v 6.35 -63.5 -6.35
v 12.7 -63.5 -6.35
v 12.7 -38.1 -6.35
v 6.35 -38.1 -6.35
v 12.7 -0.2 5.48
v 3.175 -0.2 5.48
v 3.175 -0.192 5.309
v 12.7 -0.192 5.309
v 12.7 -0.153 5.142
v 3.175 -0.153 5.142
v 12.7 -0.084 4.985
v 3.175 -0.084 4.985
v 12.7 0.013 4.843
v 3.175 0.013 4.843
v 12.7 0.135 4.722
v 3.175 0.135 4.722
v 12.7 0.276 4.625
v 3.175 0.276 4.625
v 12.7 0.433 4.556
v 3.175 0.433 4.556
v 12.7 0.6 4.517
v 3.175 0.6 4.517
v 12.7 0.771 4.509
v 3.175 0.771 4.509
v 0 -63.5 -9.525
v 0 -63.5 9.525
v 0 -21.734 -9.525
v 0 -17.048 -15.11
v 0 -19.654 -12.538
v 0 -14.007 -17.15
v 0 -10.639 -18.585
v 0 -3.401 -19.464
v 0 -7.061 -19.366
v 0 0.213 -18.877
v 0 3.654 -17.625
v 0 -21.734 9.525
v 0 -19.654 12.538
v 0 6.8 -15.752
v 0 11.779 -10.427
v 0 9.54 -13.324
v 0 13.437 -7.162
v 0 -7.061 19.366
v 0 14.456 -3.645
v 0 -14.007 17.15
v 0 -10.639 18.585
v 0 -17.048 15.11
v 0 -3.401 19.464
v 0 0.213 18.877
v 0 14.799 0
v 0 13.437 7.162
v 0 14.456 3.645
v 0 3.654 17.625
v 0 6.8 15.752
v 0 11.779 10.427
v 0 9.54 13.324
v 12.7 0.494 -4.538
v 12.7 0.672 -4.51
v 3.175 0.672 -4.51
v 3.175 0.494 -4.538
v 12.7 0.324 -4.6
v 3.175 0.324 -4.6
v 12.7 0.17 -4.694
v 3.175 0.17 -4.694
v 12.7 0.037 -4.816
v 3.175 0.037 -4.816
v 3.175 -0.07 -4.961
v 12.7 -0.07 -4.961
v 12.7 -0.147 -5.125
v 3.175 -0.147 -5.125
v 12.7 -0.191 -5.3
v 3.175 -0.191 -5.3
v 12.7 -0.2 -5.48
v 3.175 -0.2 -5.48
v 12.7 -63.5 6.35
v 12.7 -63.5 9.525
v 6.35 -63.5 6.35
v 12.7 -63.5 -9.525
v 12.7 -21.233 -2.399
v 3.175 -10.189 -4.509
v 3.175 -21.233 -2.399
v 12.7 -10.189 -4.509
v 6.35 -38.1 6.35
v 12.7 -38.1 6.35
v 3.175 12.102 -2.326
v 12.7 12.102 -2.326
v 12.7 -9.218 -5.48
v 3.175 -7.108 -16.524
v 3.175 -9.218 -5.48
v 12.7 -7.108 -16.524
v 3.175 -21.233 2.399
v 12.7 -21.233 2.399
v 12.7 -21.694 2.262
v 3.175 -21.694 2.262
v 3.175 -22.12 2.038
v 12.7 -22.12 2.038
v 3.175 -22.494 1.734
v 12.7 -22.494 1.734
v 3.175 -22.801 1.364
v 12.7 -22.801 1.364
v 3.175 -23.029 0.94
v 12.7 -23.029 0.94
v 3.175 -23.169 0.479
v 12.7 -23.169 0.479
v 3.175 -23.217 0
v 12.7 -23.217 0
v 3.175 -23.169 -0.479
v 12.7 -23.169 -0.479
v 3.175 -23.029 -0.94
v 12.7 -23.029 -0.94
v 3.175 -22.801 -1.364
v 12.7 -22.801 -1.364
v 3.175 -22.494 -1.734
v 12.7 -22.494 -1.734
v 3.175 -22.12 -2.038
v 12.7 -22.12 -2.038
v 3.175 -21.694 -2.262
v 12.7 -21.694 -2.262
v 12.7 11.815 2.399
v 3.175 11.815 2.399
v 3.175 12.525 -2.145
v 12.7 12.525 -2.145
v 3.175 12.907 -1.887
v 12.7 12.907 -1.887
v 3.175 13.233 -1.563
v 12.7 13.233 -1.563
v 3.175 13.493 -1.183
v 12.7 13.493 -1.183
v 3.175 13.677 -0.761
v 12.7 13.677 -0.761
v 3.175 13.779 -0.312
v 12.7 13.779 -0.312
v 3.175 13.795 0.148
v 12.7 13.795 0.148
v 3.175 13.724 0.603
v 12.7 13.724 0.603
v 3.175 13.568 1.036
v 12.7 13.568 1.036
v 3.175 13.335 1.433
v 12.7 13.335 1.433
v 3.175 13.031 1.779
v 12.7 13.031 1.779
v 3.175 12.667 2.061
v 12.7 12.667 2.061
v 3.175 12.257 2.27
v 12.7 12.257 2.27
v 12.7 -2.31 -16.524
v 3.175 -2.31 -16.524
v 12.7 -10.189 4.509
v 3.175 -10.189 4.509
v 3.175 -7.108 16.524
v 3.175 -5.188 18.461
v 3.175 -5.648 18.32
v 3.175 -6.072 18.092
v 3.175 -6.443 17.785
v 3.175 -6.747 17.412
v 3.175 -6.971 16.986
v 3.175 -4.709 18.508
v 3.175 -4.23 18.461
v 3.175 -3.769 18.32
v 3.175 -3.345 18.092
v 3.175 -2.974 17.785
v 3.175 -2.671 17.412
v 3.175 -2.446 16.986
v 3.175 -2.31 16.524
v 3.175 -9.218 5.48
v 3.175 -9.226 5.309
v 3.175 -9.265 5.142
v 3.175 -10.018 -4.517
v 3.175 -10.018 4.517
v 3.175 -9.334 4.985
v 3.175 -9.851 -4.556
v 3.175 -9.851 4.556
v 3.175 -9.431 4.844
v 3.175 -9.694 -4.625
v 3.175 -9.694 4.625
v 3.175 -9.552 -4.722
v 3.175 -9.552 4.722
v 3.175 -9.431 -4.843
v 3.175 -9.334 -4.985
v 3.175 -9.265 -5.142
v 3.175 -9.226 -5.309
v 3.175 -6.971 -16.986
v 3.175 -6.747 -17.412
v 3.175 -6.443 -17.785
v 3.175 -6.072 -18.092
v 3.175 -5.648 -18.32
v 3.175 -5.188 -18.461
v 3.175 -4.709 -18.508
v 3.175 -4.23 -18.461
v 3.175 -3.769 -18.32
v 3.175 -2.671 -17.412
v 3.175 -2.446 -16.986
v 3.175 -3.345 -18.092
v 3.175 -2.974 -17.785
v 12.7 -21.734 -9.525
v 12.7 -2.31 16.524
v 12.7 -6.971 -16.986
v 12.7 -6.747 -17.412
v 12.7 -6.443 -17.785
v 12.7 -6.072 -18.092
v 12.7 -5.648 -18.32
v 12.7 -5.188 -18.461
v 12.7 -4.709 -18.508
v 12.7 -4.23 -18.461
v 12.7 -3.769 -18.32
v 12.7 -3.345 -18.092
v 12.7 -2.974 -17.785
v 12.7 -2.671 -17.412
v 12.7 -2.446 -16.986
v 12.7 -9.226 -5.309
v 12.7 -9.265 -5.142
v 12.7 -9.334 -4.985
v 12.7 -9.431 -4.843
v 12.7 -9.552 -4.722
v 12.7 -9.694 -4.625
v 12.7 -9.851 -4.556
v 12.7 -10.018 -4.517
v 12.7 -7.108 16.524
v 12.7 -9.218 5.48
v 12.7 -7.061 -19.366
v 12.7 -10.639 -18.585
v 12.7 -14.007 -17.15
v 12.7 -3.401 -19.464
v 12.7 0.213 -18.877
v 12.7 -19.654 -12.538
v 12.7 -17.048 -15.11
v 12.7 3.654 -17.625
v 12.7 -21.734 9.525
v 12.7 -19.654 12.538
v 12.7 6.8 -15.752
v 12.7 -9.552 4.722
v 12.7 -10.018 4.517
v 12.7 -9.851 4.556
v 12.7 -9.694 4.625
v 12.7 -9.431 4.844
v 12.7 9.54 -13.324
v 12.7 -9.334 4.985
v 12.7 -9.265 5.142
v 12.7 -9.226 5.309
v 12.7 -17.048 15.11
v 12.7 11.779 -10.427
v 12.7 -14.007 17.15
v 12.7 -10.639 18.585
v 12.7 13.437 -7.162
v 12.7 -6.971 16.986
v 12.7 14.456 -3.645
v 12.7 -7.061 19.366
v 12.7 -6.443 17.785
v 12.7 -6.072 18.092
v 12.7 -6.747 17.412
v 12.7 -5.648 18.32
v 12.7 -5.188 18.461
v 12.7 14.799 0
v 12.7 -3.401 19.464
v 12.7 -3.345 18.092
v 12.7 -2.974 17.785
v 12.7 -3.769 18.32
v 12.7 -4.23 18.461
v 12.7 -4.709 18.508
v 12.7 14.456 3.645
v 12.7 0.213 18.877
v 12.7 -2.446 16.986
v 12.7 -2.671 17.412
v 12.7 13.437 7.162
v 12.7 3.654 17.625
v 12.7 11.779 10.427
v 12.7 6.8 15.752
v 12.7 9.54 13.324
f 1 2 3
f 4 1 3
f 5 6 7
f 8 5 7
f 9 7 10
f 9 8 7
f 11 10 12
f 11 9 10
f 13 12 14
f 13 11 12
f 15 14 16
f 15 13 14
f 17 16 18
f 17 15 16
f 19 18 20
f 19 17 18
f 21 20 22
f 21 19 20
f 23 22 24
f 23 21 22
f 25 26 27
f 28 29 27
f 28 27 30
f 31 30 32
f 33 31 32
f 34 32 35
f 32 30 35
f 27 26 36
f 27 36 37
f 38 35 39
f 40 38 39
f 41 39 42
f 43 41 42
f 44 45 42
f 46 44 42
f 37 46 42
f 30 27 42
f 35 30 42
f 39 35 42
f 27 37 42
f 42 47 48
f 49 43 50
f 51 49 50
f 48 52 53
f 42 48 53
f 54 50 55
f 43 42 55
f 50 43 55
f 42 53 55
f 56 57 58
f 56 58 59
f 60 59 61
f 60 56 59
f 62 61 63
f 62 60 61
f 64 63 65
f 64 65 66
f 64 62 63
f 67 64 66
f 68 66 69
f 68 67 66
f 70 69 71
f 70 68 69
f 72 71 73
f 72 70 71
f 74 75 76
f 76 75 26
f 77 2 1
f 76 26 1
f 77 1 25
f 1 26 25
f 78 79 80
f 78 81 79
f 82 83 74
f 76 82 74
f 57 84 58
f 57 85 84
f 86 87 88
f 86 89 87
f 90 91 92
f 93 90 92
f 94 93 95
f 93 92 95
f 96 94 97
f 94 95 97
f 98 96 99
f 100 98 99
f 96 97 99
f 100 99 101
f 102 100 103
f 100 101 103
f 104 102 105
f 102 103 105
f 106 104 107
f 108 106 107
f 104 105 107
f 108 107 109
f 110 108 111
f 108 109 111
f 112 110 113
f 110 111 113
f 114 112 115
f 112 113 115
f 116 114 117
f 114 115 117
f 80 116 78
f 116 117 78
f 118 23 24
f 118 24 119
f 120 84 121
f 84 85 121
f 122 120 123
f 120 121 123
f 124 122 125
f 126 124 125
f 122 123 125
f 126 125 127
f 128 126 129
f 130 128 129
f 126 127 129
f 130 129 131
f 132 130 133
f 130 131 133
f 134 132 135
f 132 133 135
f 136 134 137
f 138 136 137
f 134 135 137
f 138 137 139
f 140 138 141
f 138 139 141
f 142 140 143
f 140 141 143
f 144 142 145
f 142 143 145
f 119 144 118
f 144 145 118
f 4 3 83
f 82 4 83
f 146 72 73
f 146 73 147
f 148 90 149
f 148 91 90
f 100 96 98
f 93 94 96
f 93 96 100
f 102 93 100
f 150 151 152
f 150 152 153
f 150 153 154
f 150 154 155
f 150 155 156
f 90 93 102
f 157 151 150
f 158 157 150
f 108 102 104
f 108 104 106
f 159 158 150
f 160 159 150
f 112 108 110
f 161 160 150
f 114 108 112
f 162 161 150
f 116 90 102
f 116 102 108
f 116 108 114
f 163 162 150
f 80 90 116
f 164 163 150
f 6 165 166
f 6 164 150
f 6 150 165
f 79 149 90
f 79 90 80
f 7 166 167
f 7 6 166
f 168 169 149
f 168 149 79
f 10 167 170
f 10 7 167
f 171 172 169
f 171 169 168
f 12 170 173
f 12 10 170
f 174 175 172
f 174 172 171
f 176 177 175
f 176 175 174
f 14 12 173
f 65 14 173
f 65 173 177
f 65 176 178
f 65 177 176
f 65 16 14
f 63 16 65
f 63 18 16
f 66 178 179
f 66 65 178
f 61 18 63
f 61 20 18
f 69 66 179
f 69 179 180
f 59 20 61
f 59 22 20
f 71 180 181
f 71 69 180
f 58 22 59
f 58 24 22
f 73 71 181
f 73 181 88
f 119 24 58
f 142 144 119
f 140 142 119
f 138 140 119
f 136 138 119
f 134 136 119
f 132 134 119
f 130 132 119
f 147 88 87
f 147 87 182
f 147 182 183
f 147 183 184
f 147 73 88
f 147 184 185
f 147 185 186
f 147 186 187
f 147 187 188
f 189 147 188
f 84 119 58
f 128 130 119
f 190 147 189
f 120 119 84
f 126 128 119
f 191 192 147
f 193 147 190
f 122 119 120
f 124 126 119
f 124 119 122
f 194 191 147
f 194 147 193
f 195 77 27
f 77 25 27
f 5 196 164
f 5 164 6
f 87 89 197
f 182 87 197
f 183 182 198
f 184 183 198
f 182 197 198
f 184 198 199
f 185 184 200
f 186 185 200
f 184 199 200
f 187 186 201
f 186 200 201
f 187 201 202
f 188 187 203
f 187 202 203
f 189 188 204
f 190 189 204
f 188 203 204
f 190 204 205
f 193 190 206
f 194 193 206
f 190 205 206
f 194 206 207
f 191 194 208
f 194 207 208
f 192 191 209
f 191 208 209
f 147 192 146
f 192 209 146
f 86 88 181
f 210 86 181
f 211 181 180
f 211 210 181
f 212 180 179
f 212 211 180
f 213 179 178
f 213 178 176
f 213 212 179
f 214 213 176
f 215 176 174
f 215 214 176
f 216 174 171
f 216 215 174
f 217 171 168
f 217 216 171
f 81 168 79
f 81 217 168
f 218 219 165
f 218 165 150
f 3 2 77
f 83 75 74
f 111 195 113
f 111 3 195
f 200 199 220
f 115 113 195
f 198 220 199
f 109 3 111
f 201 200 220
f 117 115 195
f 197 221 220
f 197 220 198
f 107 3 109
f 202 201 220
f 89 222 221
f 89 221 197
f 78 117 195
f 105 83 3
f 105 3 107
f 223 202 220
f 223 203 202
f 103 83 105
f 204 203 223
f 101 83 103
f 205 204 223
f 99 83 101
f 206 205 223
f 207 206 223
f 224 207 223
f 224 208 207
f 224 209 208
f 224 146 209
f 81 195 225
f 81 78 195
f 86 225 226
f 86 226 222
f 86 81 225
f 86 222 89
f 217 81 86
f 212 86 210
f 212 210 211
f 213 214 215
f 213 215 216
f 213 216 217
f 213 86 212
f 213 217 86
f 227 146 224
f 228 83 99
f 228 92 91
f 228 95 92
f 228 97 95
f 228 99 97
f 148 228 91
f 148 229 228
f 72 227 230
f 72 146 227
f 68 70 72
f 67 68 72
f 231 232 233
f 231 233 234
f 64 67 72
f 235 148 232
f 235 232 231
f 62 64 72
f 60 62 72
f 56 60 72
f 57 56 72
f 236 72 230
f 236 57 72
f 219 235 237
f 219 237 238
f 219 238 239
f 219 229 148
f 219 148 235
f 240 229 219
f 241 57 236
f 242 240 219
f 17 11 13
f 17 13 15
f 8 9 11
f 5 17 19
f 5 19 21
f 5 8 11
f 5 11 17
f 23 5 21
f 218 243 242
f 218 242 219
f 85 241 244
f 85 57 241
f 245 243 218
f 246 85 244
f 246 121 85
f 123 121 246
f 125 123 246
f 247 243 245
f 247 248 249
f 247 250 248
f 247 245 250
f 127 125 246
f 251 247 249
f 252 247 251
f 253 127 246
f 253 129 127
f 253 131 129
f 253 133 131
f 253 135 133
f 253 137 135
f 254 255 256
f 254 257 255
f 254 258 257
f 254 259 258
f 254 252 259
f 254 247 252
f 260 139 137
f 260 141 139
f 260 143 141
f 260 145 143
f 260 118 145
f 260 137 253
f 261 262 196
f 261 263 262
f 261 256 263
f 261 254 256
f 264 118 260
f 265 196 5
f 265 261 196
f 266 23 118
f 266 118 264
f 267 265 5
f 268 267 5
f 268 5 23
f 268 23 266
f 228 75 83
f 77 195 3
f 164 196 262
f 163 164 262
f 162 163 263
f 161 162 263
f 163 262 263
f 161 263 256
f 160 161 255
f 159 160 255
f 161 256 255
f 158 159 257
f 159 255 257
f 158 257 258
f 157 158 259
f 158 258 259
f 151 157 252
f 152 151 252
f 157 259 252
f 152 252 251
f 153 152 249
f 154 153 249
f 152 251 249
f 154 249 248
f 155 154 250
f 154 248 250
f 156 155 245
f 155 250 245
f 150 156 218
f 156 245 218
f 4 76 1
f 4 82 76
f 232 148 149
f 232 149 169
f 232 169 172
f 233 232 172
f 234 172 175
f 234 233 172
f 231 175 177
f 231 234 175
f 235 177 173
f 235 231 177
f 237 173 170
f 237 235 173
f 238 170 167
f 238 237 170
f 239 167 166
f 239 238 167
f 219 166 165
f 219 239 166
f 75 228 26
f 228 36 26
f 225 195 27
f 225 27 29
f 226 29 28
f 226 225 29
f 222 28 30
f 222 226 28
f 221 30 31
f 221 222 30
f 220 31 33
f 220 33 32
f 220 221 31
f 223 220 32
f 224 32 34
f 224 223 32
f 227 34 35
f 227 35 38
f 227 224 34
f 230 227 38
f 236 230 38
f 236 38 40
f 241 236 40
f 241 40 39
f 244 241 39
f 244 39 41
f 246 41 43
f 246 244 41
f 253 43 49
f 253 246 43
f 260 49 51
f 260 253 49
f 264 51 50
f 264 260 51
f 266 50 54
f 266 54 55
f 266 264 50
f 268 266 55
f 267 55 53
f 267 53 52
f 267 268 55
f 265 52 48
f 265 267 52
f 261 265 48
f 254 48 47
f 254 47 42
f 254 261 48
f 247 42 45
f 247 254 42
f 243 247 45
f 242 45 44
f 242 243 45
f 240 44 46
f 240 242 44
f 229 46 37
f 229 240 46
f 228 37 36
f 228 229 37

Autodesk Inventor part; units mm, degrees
ref_plane "YZ Plane" through (0, 0, 0) normal (1, 0, 0) x (0, 1, 0)
ref_plane "XZ Plane" through (0, 0, 0) normal (0, 1, 0) x (-1, 0, 0)
ref_plane "XY Plane" through (0, 0, 0) normal (0, 0, 1) x (1, 0, 0)
sketch "Sketch1" plane through (0, 0, 0) normal (1, 0, 0) x (0, 1, 0)
  line L0 (0, 9.525) -> (-63.5, 9.525)
  line L1 (-63.5, 9.525) -> (-63.5, -9.525)
  line L2 (-63.5, -9.525) -> (0, -9.525)
  line L3 (0, -9.525) -> (0, 9.525)
  arc A0 (0, -9.525) -> (0, 9.525) centre (0, 0) ccw
  dimension "d0" = 19.05
  dimension "d1" = 63.5
extrude "Extrusion1" add sketch "Sketch1" along normal blind 12.7
sketch "Sketch3" plane through (12.7, 0, 0) normal (1, 0, 0) x (0, 0, -1)
  line L0 (-9.525, 0) -> (-9.525, -63.5) projected
  line L1 (-9.525, -63.5) -> (9.525, -63.5) projected
  line L2 (9.525, -63.5) -> (9.525, 0) projected
  arc A0 (9.525, 0) -> (-9.525, 0) centre (0, 0) ccw projected
  line L3 (-6.35, -63.5) -> (6.35, -63.5)
  line L4 (6.35, -63.5) -> (6.35, -38.1)
  line L5 (6.35, -38.1) -> (-6.35, -38.1)
  line L6 (-6.35, -38.1) -> (-6.35, -63.5)
  point P0 (0, -63.5)
  dimension "d18" = 12.7
  dimension "d19" = 6.35
  dimension "d20" = 25.4
extrude "Extrusion3" cut sketch "Sketch3" against normal blind 6.35 contours L6 L5 L4 L1
sketch "Sketch4" plane through (12.7, 0, 0) normal (1, 0, 0) x (0, 0, -1)
  line L0 (-6.35, -63.5) -> (-6.35, -38.1) projected
  line L1 (-6.35, -38.1) -> (6.35, -38.1) projected
  line L2 (6.35, -38.1) -> (6.35, -63.5) projected
  line L3 (6.35, -63.5) -> (9.525, -63.5) projected
  line L4 (9.525, -63.5) -> (9.525, 0) projected
  arc A0 (9.525, 0) -> (-9.525, 0) centre (0, 0) ccw projected
  line L5 (-9.525, 0) -> (-9.525, -63.5) projected
  line L6 (-9.525, -63.5) -> (-6.35, -63.5) projected
  circle A1 centre (0, 0) radius 9.525
  line L7 (-14.2875, 12.7) -> (12.7, 12.7)
  line L8 (12.7, 12.7) -> (12.7, -4.7625)
  line L9 (12.7, -4.7625) -> (-14.2875, -4.7625)
  line L10 (-14.2875, -4.7625) -> (-14.2875, 12.7)
  point P0 (-8.2489, -4.7625)
  point P1 (-9.525, 0)
  point P2 (9.525, 0)
  point P3 (8.2489, -4.7625)
  dimension "d28" = 19.05
extrude "Extrusion4" [suppressed]
sketch "Sketch5" plane through (12.7, 0, 0) normal (1, 0, 0) x (0, 0, -1)
  arc A0 (1.8331, 11.9745) -> (-1.9, 11.7198) centre (0, 11.3568) ccw
  line L0 (-1.9, 11.7198) -> (-4, 0.7283)
  arc A1 (-5.4371, -0.709) -> (-4, 0.7283) centre (-5.4371, 0.7281) ccw
  line L1 (-5.4371, -0.709) -> (-16.4286, -2.8088)
  arc A2 (-16.4286, -2.8088) -> (-16.4286, -6.6088) centre (-16.0656, -4.7088) ccw
  line L2 (-16.4286, -6.6088) -> (-5.4371, -8.7087)
  arc A3 (-4, -10.146) -> (-5.4371, -8.7087) centre (-5.4371, -10.1458) ccw
  line L3 (-4, -10.146) -> (-1.9, -21.1375)
  arc A4 (-1.9, -21.1375) -> (1.9, -21.1375) centre (0, -20.7745) ccw
  line L4 (1.9, -21.1375) -> (4, -10.146)
  arc A5 (5.4371, -8.7088) -> (4, -10.146) centre (5.4371, -10.146) ccw
  line L5 (5.4371, -8.7088) -> (16.4286, -6.6088)
  arc A6 (16.4286, -6.6088) -> (16.4286, -2.8088) centre (16.0656, -4.7088) ccw
  line L6 (16.4286, -2.8088) -> (5.4367, -0.7088)
  arc A7 (4.0053, 0.6052) -> (5.4367, -0.7088) centre (5.4371, 0.7283) ccw
  line L7 (4.0053, 0.6052) -> (1.8331, 11.9745)
  line L8 (-6.35, -63.5) -> (-6.35, -38.1) projected
  line L9 (-6.35, -38.1) -> (6.35, -38.1) projected
  line L10 (6.35, -38.1) -> (6.35, -63.5) projected
  line L11 (6.35, -63.5) -> (9.525, -63.5) projected
  line L12 (9.525, -63.5) -> (9.525, 0) projected
  arc A8 (9.525, 0) -> (-9.525, 0) centre (0, 0) ccw projected
  line L13 (-9.525, 0) -> (-9.525, -63.5) projected
  line L14 (-9.525, -63.5) -> (-6.35, -63.5) projected
  line L15 (-4.509, 0.7712) -> (-2.399, 11.8152)
  arc A9 (2.3259, 12.1019) -> (-2.399, 11.8152) centre (0, 11.3568) ccw
  line L16 (2.3259, 12.1019) -> (4.5097, 0.672)
  arc A10 (4.5097, 0.672) -> (5.4797, -0.1998) centre (5.4371, 0.7283) ccw
  line L17 (5.4797, -0.1998) -> (16.524, -2.3098)
  arc A11 (16.524, -7.1078) -> (16.524, -2.3098) centre (16.0656, -4.7088) ccw
  line L18 (16.524, -7.1078) -> (5.48, -9.2178)
  arc A12 (5.48, -9.2178) -> (4.509, -10.1889) centre (5.4371, -10.146) ccw
  line L19 (4.509, -10.1889) -> (2.399, -21.2328)
  arc A13 (-2.399, -21.2328) -> (2.399, -21.2328) centre (0, -20.7745) ccw
  line L20 (-2.399, -21.2328) -> (-4.509, -10.1888)
  arc A14 (-4.509, -10.1888) -> (-5.48, -9.2177) centre (-5.4371, -10.1458) ccw
  line L21 (-5.48, -9.2177) -> (-16.524, -7.1078)
  arc A15 (-16.524, -2.3098) -> (-16.524, -7.1078) centre (-16.0656, -4.7088) ccw
  line L22 (-16.524, -2.3098) -> (-5.48, -0.2)
  arc A16 (-5.48, -0.2) -> (-4.509, 0.7712) centre (-5.4371, 0.7281) ccw
  circle A17 centre (0, -4.7088) radius 19.5082
  point P0 (2.905, 9.0712)
  point P1 (9.525, -0.9727)
  point P2 (9.525, -8.445)
  point P3 (9.525, -21.7336)
  point P4 (-9.525, -21.7336)
  point P5 (-9.525, -8.4449)
  point P6 (-9.525, -0.9728)
  point P7 (-2.9244, 9.065)
  dimension "d29" = 0
  dimension "d30" = 0.508
extrude "Extrusion5" add sketch "Sketch5" against normal up to surface (12.7 mm away) contours L7 A8 L0 A0 | A0 L0 A8 L15 A9 L16 L7 | A8 L16 A10 L17 L12 L6 A7 L7 | L7 A7 L6 L12 L5 A5 L4 A4 L3 A3 L2 L13 L1 A1 L0 A8 | L0 A1 L1 L13 L22 A16 L15 A8 | L16 A9 L15 A8 L13 L22 A15 L21 A17 L12 L18 A11 L17 | L12 L17 A11 L18 L5 A6 L6 | L6 A6 L5 L12 | L13 L2 A2 L1 | L1 A2 L2 L13 L21 A15 L22 | L12 L18 A12 L19 A13 L20 A14 L21 L13 L2 A3 L3 A4 L4 A5 L5
extrude "Extrusion6" cut sketch "Sketch5" against normal blind 9.525 contours L7 A8 L0 A0 | A0 L0 A8 L15 A9 L16 L7 | A8 L16 A10 L17 L12 L6 A7 L7 | L7 A7 L6 L12 L5 A5 L4 A4 L3 A3 L2 L13 L1 A1 L0 A8 | L0 A1 L1 L13 L22 A16 L15 A8 | L12 L17 A11 L18 L5 A6 L6 | L6 A6 L5 L12 | L13 L2 A2 L1 | L1 A2 L2 L13 L21 A15 L22 | L12 L18 A12 L19 A13 L20 A14 L21 L13 L2 A3 L3 A4 L4 A5 L5
equation "\"d19\" = 0.5 * d18"
properties part number "Part_3_hand"
